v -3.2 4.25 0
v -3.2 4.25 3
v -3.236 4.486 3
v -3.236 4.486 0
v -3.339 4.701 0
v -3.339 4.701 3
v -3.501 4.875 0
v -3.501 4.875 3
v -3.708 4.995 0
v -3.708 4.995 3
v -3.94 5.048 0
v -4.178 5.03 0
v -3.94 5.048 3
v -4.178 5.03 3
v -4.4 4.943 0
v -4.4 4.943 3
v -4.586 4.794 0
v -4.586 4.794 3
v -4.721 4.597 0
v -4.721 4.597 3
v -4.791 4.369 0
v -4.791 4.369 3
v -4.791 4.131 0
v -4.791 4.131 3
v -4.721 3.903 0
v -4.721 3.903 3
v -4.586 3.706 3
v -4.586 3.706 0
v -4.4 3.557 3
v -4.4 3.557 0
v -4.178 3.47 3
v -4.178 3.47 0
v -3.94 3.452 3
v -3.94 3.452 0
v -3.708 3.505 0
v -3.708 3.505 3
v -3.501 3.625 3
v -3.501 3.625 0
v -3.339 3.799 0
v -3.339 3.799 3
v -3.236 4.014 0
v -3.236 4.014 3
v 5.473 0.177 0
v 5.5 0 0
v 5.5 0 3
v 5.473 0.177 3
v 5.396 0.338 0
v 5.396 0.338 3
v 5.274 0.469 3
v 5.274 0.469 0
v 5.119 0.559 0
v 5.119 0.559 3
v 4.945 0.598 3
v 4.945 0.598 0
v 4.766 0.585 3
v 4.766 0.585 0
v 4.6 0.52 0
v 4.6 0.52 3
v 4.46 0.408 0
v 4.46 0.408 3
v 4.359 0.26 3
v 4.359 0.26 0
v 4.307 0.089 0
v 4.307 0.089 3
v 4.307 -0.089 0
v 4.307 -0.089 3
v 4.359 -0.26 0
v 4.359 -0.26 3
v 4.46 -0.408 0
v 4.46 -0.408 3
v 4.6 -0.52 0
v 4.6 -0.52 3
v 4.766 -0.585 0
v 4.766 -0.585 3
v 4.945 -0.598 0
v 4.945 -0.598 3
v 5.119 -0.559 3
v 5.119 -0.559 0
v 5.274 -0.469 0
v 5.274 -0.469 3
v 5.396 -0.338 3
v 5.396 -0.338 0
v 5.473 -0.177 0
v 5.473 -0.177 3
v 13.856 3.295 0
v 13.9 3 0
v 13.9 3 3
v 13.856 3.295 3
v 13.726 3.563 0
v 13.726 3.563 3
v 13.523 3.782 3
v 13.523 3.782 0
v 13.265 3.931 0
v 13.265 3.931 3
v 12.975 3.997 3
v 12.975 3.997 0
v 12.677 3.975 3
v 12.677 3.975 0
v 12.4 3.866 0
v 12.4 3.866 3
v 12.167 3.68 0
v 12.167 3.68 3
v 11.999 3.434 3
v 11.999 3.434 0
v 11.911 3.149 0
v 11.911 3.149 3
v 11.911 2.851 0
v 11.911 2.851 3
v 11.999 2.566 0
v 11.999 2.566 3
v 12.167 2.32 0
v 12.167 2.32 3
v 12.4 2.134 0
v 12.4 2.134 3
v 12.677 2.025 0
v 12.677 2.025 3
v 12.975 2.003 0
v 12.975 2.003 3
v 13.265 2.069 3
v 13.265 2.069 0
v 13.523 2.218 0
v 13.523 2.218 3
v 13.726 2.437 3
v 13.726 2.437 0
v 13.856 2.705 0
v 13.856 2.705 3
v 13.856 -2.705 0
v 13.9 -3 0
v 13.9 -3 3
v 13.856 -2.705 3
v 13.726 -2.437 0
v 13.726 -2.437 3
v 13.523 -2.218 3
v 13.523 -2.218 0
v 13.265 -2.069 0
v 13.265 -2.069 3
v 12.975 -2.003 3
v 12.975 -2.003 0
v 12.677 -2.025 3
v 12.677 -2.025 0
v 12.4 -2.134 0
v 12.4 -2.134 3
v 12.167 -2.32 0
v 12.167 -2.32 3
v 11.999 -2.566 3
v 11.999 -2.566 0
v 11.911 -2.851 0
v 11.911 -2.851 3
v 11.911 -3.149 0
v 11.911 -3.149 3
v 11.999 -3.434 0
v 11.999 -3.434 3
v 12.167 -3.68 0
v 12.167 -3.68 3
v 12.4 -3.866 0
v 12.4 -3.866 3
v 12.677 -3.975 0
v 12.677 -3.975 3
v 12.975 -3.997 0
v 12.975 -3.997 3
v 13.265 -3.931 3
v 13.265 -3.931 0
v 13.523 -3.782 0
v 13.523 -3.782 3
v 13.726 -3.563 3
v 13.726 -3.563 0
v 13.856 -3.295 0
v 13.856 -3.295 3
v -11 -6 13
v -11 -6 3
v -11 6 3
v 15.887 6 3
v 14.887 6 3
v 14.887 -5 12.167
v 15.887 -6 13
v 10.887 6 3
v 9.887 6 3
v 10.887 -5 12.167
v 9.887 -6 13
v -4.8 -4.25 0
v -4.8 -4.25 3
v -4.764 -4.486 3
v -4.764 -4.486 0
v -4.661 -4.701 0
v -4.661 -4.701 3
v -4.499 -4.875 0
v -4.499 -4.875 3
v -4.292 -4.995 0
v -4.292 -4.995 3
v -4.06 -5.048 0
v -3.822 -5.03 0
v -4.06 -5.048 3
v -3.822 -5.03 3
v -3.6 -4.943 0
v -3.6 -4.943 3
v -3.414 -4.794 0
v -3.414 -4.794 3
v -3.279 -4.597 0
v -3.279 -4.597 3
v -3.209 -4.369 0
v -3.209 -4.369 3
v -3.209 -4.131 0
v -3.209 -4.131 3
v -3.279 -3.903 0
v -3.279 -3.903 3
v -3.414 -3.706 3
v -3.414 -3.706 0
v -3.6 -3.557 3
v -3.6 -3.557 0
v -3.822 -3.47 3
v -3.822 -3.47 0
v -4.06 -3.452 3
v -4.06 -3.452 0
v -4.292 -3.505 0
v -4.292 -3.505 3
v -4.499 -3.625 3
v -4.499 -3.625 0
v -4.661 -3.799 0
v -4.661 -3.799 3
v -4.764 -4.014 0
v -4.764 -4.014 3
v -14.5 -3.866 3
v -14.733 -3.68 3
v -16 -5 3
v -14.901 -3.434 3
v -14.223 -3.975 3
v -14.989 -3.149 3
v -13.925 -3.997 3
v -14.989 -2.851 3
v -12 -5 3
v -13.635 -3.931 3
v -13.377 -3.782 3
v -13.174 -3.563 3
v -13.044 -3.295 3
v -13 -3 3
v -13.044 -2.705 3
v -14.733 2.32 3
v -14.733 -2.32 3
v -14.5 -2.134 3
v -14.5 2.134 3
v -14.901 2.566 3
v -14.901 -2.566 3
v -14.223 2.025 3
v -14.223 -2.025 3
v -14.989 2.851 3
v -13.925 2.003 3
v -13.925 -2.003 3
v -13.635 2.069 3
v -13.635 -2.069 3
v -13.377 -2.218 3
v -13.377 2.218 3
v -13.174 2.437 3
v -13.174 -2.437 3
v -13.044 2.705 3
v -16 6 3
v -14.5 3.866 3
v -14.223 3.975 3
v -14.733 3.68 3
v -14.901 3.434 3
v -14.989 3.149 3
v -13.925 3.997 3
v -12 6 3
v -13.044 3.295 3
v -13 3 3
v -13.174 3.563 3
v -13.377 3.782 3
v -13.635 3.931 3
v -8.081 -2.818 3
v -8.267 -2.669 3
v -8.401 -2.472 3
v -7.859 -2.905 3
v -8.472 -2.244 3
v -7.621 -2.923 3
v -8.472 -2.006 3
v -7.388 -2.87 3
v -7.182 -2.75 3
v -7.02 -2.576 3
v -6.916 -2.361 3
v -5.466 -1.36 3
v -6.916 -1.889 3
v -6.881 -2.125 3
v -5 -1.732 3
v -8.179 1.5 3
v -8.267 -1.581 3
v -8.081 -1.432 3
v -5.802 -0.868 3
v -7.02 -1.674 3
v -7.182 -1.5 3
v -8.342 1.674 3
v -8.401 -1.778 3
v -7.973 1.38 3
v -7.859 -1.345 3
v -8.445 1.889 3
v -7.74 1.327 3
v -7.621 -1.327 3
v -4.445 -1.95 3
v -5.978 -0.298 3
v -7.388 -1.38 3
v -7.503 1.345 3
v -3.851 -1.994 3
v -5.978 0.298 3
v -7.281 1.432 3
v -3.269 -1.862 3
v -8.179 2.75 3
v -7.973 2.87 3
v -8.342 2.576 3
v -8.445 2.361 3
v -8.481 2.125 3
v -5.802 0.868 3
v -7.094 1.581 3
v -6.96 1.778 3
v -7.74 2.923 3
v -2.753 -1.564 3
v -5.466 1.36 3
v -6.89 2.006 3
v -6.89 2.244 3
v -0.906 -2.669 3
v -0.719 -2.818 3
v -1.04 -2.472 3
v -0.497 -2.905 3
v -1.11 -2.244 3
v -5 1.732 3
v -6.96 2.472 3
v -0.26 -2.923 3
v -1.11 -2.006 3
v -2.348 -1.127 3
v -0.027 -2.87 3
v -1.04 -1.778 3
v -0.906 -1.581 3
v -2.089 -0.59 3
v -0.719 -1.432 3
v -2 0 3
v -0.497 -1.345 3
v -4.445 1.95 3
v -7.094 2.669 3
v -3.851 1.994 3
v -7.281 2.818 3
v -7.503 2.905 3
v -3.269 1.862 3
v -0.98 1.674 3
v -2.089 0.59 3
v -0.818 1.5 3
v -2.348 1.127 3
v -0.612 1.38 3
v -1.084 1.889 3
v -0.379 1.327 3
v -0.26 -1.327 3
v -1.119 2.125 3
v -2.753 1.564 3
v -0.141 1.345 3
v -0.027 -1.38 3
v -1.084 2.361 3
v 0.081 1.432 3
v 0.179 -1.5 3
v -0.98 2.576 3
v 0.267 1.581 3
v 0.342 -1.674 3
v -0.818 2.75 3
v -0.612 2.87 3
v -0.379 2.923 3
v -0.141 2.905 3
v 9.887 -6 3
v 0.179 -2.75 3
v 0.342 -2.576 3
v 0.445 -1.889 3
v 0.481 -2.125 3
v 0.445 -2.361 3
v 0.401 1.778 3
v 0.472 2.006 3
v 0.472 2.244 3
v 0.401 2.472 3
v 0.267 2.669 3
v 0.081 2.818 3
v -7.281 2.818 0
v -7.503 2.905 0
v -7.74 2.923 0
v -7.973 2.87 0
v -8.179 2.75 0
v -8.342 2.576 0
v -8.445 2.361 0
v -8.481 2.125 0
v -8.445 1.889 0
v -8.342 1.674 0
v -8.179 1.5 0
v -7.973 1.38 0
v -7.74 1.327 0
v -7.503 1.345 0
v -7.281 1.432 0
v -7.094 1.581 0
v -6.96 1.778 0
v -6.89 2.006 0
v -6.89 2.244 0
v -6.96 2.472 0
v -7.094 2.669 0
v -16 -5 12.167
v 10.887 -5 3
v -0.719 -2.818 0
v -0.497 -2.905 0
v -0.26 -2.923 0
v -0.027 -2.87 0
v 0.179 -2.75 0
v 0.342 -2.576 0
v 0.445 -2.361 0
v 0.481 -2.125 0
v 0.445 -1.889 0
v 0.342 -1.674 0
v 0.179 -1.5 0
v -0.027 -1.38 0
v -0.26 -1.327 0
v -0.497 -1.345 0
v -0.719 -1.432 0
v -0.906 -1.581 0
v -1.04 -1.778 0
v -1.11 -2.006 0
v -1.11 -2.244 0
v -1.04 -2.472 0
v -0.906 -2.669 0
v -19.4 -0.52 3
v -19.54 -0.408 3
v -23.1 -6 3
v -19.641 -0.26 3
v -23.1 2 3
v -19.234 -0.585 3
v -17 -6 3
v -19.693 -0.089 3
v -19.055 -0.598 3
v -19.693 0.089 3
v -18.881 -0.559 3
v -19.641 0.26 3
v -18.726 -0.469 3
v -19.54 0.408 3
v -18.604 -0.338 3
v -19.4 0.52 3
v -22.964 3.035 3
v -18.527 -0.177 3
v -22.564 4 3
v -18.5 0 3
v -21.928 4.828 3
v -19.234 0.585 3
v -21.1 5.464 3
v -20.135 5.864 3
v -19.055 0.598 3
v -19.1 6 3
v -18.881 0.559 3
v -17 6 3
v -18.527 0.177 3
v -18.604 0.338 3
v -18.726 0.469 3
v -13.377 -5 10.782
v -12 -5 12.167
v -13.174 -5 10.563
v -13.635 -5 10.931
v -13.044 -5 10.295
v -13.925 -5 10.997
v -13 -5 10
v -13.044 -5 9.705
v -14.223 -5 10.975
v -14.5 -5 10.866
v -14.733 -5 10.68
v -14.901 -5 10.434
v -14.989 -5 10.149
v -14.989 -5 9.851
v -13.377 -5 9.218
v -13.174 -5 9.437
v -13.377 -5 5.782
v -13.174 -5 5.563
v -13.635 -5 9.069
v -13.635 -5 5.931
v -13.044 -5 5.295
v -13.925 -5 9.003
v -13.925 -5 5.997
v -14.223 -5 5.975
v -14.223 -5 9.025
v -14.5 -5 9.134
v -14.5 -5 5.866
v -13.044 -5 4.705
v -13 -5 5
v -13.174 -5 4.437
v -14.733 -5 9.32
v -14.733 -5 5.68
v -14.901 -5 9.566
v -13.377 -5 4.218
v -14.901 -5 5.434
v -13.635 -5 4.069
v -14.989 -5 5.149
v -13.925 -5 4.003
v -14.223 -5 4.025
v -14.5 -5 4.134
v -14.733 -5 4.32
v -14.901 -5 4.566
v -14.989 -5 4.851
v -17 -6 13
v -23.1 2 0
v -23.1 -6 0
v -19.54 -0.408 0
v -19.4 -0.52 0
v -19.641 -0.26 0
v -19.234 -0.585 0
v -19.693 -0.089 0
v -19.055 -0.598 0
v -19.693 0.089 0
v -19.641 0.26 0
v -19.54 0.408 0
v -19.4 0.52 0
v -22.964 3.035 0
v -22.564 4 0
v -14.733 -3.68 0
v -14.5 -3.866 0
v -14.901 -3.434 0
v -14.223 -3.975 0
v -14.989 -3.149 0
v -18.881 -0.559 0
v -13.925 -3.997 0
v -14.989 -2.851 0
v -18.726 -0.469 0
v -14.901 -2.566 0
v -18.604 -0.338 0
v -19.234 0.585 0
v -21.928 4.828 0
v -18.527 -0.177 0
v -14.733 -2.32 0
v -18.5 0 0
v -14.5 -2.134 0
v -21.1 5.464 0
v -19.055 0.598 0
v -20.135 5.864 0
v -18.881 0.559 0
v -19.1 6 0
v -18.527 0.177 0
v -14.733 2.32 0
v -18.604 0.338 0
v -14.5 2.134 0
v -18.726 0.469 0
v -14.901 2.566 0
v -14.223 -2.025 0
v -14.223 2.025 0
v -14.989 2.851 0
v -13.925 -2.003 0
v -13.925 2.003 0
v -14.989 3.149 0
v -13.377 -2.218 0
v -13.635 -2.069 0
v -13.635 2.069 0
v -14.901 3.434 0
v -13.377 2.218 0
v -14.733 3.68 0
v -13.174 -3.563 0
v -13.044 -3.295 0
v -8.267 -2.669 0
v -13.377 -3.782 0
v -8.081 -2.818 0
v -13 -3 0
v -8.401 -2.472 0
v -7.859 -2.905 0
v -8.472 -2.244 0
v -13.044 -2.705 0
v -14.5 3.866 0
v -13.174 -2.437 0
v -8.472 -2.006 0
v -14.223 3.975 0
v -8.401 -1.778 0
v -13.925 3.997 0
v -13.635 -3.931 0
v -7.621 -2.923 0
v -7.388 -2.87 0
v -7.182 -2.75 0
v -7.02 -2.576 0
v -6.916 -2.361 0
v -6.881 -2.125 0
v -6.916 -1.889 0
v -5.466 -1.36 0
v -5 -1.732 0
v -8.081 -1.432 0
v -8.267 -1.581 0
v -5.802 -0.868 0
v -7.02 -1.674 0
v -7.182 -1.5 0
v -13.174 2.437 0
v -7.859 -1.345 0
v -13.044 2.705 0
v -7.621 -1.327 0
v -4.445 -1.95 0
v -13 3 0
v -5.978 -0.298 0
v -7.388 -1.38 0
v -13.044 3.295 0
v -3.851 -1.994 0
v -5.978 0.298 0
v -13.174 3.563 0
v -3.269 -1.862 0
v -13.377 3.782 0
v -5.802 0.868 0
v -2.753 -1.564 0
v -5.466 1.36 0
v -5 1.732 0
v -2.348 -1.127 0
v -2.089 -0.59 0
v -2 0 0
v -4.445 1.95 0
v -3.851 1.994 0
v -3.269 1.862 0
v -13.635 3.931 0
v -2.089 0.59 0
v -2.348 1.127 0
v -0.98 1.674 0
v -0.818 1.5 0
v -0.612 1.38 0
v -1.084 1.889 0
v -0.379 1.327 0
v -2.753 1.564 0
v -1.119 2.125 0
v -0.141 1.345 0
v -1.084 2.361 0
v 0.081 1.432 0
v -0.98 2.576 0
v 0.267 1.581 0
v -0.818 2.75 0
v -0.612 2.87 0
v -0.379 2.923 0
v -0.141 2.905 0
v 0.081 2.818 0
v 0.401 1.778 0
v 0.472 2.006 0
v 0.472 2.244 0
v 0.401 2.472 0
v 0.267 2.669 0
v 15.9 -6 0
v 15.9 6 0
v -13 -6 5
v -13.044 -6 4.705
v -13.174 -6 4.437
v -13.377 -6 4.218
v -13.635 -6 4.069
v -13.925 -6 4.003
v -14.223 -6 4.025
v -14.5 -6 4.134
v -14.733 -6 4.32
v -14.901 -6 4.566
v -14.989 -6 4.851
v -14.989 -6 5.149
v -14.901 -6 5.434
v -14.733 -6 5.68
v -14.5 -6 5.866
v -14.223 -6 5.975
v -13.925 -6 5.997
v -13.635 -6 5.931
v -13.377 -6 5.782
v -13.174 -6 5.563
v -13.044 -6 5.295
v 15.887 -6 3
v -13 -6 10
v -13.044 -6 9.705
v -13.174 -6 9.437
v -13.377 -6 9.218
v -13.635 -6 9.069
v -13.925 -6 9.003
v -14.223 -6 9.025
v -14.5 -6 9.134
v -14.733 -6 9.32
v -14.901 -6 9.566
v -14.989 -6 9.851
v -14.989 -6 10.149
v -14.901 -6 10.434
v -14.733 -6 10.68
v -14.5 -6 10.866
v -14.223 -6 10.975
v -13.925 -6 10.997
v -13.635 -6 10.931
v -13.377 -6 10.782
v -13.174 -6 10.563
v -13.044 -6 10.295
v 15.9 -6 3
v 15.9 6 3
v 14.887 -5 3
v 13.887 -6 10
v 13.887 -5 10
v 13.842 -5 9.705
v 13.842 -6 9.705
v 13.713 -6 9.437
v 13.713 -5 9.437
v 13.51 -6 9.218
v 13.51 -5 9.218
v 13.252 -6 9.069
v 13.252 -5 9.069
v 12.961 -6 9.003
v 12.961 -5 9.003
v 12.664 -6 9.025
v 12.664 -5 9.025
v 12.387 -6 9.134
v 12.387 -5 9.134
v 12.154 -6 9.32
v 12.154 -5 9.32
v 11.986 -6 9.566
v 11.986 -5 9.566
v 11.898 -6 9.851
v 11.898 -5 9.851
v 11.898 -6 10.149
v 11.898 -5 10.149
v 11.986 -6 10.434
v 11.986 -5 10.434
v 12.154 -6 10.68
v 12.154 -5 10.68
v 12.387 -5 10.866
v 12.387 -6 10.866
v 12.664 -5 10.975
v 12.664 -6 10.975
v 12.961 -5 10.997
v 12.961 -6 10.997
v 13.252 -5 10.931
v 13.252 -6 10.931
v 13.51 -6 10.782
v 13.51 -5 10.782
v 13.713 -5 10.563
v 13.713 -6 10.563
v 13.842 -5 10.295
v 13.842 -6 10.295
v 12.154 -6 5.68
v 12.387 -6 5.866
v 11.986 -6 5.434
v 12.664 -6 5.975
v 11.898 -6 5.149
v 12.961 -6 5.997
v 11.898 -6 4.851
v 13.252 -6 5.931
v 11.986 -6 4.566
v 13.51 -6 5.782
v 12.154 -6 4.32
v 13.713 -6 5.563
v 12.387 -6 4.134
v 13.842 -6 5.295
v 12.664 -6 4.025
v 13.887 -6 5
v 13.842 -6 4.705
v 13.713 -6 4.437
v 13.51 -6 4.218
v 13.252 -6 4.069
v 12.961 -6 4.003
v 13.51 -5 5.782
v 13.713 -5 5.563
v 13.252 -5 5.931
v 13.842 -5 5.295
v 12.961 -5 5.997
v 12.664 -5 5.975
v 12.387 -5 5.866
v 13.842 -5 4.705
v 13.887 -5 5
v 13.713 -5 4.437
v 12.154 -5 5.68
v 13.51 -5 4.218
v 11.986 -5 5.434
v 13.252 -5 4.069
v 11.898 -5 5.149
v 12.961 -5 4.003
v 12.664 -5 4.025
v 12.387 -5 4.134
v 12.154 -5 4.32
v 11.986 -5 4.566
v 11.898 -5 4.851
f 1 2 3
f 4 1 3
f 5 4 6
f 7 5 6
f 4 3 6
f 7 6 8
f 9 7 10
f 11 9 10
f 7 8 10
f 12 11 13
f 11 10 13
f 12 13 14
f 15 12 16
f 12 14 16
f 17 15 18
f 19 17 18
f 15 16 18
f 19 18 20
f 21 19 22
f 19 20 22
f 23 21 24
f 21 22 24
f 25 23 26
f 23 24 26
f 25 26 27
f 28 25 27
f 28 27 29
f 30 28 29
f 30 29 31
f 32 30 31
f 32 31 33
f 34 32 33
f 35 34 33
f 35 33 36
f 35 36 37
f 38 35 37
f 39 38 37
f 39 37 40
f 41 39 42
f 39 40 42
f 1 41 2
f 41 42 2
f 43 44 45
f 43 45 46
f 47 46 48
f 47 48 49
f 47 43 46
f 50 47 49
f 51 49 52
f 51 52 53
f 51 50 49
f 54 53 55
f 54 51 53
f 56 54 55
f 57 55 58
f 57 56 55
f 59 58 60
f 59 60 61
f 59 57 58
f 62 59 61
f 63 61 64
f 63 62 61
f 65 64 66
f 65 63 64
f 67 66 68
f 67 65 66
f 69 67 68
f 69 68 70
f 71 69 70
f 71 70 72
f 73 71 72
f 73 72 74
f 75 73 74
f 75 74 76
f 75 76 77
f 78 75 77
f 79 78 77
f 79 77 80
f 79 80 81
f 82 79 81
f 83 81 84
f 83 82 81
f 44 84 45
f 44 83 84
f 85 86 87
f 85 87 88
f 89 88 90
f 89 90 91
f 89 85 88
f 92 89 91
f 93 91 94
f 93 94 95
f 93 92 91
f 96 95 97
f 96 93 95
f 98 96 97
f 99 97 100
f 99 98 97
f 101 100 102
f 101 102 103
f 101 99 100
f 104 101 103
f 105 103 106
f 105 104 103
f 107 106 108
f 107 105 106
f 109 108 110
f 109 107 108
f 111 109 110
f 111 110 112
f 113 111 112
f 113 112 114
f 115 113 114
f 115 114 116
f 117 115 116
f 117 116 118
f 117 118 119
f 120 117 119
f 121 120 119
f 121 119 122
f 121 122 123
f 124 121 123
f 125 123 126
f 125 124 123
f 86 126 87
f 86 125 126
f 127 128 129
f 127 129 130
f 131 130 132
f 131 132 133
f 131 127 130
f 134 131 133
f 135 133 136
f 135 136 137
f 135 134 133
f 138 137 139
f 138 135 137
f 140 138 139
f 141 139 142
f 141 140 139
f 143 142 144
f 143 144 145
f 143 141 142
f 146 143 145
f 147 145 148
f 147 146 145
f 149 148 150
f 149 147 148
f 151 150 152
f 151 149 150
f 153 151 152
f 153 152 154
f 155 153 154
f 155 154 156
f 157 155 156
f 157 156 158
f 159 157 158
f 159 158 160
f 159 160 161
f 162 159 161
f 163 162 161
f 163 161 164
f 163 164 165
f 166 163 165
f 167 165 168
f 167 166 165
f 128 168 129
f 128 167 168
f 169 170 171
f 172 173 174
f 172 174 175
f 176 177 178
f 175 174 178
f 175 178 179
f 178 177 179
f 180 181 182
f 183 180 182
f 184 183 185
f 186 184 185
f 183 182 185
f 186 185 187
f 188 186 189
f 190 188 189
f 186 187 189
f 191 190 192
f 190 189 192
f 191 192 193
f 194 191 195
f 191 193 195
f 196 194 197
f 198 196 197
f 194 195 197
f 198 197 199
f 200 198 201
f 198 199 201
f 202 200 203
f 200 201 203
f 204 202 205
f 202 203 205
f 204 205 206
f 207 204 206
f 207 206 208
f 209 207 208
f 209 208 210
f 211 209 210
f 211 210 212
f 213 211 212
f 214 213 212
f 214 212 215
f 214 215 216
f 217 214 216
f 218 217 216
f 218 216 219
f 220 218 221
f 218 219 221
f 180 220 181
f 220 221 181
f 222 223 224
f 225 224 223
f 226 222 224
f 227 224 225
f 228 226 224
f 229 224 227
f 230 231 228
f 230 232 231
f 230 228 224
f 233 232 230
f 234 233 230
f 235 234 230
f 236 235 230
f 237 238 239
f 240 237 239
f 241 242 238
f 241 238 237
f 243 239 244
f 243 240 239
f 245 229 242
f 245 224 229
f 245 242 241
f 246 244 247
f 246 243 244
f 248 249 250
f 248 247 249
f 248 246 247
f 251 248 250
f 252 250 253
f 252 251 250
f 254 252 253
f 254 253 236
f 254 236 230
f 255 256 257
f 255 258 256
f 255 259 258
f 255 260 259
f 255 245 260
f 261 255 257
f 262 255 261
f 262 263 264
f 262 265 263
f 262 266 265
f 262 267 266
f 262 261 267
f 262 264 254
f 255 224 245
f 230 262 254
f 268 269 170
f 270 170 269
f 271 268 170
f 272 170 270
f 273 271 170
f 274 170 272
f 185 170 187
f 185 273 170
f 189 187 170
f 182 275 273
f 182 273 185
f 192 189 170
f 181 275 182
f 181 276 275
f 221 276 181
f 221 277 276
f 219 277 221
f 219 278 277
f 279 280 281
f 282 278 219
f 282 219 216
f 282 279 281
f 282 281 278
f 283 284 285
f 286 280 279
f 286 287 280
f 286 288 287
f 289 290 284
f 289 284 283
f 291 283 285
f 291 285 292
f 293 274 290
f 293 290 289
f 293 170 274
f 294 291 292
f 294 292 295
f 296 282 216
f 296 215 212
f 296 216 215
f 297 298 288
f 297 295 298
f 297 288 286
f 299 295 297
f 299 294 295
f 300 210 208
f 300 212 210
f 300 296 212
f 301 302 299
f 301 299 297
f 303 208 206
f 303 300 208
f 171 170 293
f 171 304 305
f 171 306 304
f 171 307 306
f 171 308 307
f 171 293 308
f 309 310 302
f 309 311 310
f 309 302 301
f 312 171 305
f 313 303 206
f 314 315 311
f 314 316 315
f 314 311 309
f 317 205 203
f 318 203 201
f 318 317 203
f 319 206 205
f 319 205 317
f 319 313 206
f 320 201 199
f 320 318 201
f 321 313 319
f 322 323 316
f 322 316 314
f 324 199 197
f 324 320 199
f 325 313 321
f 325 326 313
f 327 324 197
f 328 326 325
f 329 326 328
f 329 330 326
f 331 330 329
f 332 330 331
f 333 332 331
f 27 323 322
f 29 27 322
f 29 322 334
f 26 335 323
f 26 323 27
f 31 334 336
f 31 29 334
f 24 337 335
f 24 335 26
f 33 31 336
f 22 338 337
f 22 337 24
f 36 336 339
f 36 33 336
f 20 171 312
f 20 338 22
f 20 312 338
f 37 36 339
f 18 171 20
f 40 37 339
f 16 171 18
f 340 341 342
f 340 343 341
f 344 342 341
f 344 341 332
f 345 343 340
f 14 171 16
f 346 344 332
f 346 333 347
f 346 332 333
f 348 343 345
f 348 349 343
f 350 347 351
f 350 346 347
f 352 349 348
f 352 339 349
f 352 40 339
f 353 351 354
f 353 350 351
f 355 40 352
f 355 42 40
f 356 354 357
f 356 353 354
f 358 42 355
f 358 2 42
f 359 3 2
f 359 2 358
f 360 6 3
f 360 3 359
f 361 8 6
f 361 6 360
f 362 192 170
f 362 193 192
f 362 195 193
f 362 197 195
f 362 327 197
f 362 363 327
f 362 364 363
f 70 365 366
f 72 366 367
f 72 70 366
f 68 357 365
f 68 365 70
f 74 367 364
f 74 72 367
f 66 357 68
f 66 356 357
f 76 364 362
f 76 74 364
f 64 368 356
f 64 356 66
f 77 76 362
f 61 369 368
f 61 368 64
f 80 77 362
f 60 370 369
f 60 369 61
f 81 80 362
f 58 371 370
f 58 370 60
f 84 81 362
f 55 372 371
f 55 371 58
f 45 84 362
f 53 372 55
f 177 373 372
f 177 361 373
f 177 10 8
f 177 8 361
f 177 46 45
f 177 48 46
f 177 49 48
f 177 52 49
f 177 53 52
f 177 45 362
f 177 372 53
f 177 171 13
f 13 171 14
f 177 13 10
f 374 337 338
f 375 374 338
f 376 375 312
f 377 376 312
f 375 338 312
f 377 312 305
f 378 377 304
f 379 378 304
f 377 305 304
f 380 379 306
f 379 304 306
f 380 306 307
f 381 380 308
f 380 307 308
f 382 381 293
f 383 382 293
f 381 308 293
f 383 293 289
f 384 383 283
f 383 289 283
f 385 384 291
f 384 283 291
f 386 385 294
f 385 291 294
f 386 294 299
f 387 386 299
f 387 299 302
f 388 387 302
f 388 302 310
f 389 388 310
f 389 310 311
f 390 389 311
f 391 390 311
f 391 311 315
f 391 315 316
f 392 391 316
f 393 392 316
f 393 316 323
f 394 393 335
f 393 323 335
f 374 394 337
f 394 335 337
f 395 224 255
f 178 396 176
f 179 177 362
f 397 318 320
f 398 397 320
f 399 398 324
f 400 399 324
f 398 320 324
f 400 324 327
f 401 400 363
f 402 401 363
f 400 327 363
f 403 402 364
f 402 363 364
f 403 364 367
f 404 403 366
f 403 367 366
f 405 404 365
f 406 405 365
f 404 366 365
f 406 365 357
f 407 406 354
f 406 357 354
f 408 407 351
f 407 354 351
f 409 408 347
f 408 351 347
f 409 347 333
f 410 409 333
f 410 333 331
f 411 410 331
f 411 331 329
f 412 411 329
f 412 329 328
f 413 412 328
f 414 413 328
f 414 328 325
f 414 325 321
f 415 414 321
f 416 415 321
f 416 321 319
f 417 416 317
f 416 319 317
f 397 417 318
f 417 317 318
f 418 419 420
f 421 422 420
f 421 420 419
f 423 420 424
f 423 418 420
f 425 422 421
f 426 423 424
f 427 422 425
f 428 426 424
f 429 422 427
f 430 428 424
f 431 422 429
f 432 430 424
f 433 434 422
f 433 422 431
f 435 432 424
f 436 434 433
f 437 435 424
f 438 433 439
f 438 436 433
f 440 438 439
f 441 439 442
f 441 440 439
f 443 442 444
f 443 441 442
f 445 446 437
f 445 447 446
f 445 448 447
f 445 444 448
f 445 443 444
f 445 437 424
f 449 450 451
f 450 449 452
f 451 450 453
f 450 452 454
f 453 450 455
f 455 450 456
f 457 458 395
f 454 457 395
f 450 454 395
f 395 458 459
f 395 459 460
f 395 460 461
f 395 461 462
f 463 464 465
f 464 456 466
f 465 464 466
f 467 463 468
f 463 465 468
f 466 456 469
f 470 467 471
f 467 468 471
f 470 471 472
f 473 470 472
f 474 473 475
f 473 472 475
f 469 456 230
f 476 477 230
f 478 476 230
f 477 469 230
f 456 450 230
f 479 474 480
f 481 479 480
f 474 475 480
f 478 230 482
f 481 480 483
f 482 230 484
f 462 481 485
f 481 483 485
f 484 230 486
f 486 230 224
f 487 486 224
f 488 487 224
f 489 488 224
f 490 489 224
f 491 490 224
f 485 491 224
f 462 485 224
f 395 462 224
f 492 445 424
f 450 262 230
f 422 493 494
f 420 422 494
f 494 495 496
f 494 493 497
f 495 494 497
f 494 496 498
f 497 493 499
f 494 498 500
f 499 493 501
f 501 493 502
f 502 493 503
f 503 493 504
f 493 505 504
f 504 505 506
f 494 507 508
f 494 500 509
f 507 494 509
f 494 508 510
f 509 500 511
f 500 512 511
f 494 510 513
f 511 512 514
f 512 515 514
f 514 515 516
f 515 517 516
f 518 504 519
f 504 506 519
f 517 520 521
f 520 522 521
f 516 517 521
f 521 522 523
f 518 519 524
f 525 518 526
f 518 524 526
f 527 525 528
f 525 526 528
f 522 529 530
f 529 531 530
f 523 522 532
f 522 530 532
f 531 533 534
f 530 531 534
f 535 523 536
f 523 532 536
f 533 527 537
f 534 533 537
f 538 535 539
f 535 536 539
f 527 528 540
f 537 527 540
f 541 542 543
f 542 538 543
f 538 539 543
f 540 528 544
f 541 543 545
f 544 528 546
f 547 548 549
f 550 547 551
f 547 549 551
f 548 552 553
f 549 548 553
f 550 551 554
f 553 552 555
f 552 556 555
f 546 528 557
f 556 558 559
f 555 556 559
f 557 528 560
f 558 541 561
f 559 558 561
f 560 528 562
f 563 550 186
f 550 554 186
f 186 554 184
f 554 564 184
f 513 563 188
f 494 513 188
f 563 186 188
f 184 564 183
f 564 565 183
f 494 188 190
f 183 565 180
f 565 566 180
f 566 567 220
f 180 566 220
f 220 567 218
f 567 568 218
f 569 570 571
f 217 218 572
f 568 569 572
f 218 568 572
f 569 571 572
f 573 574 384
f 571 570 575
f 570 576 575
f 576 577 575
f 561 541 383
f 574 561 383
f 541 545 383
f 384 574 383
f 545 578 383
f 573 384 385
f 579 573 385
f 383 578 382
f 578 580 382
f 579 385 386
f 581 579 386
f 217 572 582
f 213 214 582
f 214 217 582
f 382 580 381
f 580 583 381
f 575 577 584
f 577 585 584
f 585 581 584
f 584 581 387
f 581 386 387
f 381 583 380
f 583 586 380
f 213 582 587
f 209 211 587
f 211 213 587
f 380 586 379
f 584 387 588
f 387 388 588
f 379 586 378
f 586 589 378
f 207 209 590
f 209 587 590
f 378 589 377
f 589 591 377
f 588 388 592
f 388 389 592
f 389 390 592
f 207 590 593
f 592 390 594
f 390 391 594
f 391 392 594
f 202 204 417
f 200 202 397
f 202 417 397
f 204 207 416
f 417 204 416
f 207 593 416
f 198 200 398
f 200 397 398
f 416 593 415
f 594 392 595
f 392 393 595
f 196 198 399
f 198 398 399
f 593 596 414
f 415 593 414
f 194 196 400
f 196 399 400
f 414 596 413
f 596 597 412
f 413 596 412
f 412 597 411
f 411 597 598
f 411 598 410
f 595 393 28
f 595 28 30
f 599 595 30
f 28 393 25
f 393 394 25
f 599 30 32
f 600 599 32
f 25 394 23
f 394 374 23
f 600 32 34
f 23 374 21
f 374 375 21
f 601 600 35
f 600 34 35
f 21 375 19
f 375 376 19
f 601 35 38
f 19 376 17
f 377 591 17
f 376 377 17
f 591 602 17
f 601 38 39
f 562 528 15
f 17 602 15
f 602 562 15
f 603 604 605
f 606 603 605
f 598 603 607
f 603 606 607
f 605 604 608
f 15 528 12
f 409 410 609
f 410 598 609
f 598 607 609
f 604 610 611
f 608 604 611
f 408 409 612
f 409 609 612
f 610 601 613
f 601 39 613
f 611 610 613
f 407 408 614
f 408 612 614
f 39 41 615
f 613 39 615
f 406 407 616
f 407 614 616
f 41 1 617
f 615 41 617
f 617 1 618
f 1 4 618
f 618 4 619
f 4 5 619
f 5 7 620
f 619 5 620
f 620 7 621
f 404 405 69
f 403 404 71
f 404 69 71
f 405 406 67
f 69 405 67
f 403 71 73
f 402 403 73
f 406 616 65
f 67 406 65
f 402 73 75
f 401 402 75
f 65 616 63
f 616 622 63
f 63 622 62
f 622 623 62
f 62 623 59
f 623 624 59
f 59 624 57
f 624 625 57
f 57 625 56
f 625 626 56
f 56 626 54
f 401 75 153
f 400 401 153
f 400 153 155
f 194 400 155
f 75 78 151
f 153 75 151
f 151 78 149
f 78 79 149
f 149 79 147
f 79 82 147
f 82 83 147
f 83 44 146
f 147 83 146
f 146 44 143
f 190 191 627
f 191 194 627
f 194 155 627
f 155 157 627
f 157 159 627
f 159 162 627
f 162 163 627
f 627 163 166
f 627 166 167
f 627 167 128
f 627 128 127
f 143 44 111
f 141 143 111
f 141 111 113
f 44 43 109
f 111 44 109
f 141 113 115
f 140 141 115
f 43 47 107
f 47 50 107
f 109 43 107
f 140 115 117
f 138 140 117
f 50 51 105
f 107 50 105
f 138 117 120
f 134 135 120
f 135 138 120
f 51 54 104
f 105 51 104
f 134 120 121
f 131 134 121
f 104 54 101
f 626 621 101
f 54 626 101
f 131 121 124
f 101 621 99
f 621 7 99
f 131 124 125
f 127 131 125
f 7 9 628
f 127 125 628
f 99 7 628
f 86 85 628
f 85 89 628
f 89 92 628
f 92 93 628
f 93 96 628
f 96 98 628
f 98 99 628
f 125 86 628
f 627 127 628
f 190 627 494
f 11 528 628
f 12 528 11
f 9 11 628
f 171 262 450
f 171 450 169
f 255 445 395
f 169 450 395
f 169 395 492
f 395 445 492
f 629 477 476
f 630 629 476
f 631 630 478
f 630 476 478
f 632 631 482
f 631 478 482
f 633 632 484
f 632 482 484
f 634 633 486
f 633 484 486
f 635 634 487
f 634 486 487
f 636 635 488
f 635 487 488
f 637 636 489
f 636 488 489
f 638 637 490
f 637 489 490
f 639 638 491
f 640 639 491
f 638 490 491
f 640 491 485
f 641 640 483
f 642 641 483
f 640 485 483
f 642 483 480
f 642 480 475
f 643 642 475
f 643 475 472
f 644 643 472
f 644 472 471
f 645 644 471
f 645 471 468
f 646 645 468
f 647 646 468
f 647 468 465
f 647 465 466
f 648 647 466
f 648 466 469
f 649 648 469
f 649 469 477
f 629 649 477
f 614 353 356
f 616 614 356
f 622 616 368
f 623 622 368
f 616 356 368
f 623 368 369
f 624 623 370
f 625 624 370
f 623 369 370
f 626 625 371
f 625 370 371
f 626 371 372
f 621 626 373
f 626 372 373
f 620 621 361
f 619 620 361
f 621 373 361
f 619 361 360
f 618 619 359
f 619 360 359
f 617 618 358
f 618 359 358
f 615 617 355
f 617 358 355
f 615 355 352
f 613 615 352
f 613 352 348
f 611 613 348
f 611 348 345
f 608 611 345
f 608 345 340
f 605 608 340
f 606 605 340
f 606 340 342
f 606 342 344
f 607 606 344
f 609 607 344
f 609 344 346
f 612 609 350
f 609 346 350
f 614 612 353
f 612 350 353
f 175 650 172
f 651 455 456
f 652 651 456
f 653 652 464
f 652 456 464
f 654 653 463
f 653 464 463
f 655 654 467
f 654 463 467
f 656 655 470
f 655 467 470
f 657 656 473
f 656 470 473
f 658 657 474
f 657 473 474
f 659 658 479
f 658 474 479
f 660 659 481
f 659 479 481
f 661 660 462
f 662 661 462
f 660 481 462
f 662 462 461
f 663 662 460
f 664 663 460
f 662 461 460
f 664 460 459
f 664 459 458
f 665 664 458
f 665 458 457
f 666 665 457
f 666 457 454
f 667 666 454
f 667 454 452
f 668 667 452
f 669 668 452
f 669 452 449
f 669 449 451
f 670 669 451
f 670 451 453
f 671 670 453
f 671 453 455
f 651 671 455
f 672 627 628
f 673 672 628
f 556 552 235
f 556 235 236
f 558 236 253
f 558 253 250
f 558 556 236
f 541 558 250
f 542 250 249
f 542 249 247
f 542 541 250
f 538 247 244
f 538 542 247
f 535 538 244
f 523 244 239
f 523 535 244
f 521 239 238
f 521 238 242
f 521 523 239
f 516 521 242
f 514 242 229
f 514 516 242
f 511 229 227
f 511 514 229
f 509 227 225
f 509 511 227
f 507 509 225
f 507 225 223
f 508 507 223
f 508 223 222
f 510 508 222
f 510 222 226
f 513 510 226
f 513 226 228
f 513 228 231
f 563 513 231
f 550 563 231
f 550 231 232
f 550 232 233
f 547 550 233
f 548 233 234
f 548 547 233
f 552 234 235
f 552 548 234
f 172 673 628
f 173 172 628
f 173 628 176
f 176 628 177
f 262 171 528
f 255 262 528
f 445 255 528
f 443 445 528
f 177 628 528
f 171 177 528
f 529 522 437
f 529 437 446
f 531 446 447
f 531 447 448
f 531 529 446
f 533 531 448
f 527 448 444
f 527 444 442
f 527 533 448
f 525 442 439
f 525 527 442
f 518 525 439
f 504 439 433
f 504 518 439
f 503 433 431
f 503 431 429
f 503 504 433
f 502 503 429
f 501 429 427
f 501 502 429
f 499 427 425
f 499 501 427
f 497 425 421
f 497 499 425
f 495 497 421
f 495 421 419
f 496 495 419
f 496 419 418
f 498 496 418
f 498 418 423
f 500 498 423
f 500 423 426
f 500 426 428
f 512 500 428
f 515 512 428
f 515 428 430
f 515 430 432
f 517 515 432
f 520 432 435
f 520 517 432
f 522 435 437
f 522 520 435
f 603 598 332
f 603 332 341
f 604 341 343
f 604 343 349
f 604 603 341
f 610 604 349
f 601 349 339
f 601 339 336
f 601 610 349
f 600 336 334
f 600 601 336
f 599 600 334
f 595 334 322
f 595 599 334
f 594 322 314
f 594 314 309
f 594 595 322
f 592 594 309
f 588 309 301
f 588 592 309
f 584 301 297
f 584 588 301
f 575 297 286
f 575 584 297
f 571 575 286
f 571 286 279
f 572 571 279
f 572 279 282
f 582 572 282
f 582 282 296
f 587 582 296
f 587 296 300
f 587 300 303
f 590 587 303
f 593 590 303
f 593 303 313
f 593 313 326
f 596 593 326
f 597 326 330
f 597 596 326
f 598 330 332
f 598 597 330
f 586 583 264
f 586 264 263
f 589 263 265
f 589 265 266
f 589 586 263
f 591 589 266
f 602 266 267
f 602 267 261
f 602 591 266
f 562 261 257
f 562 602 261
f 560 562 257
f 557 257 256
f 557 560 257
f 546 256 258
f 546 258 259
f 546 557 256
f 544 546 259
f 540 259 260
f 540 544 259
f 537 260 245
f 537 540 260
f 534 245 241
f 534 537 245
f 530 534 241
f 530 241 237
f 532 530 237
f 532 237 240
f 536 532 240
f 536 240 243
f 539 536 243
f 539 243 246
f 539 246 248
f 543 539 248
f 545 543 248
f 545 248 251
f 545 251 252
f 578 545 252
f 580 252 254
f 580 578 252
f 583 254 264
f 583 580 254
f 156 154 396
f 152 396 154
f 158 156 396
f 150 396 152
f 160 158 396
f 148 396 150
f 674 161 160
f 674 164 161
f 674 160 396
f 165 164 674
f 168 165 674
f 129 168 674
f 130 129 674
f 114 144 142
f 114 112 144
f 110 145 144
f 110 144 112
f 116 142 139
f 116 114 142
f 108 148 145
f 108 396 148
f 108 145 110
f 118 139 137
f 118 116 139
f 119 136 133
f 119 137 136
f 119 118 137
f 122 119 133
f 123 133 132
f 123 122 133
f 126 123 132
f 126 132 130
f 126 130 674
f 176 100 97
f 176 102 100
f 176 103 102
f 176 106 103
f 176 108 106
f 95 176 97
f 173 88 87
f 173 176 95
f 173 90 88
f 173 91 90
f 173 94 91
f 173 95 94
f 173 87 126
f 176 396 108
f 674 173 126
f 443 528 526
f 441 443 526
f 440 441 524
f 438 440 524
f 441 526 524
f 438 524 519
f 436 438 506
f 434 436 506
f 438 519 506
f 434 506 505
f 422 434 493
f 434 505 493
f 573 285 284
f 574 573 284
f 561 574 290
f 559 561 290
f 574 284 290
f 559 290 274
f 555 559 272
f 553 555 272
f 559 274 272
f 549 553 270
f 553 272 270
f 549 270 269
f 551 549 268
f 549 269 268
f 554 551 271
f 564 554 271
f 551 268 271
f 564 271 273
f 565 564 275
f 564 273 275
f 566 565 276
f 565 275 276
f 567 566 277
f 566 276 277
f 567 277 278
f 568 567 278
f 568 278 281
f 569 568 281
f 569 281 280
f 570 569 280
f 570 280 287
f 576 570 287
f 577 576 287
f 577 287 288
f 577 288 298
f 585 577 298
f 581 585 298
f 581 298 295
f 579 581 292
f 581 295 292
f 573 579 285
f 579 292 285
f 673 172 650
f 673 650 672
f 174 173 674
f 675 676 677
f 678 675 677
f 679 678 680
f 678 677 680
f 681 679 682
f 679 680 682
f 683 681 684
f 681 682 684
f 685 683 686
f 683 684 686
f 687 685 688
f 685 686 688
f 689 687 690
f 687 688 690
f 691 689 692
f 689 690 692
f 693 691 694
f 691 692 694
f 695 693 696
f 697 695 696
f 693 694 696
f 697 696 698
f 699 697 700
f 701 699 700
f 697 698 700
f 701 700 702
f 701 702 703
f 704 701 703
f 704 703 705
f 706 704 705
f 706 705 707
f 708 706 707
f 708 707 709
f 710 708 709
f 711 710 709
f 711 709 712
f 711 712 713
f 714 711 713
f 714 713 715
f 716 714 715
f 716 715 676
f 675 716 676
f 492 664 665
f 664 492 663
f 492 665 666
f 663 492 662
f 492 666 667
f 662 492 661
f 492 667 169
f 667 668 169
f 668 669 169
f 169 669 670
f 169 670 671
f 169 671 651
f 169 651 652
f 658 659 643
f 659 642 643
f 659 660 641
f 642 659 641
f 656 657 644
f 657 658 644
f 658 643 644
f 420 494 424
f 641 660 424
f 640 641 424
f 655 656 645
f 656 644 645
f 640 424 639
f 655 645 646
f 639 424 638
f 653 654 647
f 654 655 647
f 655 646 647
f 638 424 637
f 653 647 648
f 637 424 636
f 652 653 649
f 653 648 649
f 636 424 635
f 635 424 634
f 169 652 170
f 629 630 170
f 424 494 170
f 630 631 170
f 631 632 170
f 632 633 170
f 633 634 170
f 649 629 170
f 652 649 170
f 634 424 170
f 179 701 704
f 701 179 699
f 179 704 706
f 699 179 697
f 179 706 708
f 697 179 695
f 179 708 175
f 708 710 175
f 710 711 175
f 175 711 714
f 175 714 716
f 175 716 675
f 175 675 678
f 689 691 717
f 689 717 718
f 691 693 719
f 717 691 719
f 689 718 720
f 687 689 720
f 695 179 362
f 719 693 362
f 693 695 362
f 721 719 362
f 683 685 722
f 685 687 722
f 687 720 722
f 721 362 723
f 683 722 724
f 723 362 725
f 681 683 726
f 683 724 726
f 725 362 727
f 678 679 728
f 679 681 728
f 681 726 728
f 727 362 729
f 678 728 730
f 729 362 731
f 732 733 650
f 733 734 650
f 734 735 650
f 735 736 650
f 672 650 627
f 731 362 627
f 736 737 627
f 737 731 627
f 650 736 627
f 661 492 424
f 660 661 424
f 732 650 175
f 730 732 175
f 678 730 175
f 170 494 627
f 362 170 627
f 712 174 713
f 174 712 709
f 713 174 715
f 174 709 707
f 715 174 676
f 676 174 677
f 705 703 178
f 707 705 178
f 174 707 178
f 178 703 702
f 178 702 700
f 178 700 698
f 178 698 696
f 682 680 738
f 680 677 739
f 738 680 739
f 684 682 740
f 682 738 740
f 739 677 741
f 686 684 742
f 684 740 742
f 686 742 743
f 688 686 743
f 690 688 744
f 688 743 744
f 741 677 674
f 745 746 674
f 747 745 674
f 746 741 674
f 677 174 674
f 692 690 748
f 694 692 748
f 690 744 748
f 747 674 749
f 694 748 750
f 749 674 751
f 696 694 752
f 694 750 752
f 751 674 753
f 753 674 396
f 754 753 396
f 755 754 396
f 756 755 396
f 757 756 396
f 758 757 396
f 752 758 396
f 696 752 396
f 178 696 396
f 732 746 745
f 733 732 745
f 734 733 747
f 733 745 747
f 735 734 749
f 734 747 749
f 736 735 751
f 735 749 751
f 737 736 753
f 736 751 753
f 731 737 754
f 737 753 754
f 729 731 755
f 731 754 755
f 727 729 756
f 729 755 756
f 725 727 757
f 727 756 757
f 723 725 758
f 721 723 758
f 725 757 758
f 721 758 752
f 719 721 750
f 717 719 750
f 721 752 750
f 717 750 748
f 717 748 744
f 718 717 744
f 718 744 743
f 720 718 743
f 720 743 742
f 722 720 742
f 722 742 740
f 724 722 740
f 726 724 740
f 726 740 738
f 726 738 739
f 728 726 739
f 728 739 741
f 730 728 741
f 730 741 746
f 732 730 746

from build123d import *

# Parameters (mm, degrees)
SKETCH1_R           = 2
SKETCH1_R_2         = 0.6
SKETCH1_R_3         = 1
BOSS_EXTRUDE1_DEPTH = 3
SKETCH3_R           = 0.8
CUT_EXTRUDE1_DEPTH  = 3
CIRPATTERN1_COUNT   = 6
BOSS_EXTRUDE3_DEPTH = 10
CUT_EXTRUDE2_DEPTH  = 45
SKETCH7_R           = 1
CUT_EXTRUDE3_DEPTH  = 10
LPATTERN1_COUNT     = 2
LPATTERN1_PITCH     = 26.886757186


with BuildPart() as part:
    # Sketch1 → Boss-Extrude1 (new body)
    with BuildSketch(Plane.XY):
        with BuildLine():
            Line((-23.1, -6), (15.9, -6))
            Line((15.9, -6), (15.9, 6))
            Line((15.9, 6), (-19.1, 6))
            ThreePointArc((-19.1, 6), (-21.928427125, 4.828427125), (-23.1, 2))
            Line((-23.1, 2), (-23.1, -6))
        make_face()
        with Locations((-4, 0)):
            Circle(SKETCH1_R, mode=Mode.SUBTRACT)
        with Locations((4.9, 0)):
            Circle(SKETCH1_R_2, mode=Mode.SUBTRACT)
        with Locations((-19.1, 0)):
            Circle(SKETCH1_R_2, mode=Mode.SUBTRACT)
        with Locations((12.9, 3)):
            Circle(SKETCH1_R_3, mode=Mode.SUBTRACT)
        with Locations((12.9, -3)):
            Circle(SKETCH1_R_3, mode=Mode.SUBTRACT)
        with Locations((-14, -3)):
            Circle(SKETCH1_R_3, mode=Mode.SUBTRACT)
        with Locations((-14, 3)):
            Circle(SKETCH1_R_3, mode=Mode.SUBTRACT)
    extrude(amount=BOSS_EXTRUDE1_DEPTH)

    # Sketch3 → Cut-Extrude1 (cut)
    with BuildSketch(Plane.XY.offset(3)):
        with Locations((-4, 4.25)):
            Circle(SKETCH3_R)
    cut_extrude1 = extrude(amount=-CUT_EXTRUDE1_DEPTH, mode=Mode.SUBTRACT)

    # CirPattern1: Cut-Extrude1 ×6 about axis
    cirpattern1_axis = Axis((-4, 0, 0), (0, 0, 1))
    for i in range(1, CIRPATTERN1_COUNT):
        add(cut_extrude1.rotate(cirpattern1_axis, i * 360 / CIRPATTERN1_COUNT), mode=Mode.SUBTRACT)

    # Sketch4 → Boss-Extrude3 (add)
    with BuildSketch(Plane.XY.offset(3)):
        Polygon((-17, 6), (-17, -6), (-11, -6), (-11, 6), (-12, 6), (-12, -5), (-16, -5), (-16, 6), align=None)
    boss_extrude3 = extrude(amount=BOSS_EXTRUDE3_DEPTH)

    # Sketch5 → Cut-Extrude2 (cut)
    with BuildSketch(Plane.ZY.offset(17)):
        Polygon((3, 6), (13, -6), (13, 6), align=None)
    cut_extrude2 = extrude(amount=-CUT_EXTRUDE2_DEPTH, mode=Mode.SUBTRACT)

    # Sketch7 → Cut-Extrude3 (cut)
    with BuildSketch(Plane(origin=(0, -5, 0), x_dir=(1, 0, 0), z_dir=(0, 1, 0))):
        with Locations((-14, -5)):
            Circle(SKETCH7_R)
        with Locations((-14, -10)):
            Circle(SKETCH7_R)
    cut_extrude3 = extrude(amount=-CUT_EXTRUDE3_DEPTH, mode=Mode.SUBTRACT)

    # LPattern1: Boss-Extrude3, Cut-Extrude2, Cut-Extrude3 ×2
    with Locations(*[(i * LPATTERN1_PITCH, 0, 0) for i in range(1, LPATTERN1_COUNT)]):
        add(boss_extrude3)
        add(cut_extrude2, mode=Mode.SUBTRACT)
        add(cut_extrude3, mode=Mode.SUBTRACT)


solid = part.part
